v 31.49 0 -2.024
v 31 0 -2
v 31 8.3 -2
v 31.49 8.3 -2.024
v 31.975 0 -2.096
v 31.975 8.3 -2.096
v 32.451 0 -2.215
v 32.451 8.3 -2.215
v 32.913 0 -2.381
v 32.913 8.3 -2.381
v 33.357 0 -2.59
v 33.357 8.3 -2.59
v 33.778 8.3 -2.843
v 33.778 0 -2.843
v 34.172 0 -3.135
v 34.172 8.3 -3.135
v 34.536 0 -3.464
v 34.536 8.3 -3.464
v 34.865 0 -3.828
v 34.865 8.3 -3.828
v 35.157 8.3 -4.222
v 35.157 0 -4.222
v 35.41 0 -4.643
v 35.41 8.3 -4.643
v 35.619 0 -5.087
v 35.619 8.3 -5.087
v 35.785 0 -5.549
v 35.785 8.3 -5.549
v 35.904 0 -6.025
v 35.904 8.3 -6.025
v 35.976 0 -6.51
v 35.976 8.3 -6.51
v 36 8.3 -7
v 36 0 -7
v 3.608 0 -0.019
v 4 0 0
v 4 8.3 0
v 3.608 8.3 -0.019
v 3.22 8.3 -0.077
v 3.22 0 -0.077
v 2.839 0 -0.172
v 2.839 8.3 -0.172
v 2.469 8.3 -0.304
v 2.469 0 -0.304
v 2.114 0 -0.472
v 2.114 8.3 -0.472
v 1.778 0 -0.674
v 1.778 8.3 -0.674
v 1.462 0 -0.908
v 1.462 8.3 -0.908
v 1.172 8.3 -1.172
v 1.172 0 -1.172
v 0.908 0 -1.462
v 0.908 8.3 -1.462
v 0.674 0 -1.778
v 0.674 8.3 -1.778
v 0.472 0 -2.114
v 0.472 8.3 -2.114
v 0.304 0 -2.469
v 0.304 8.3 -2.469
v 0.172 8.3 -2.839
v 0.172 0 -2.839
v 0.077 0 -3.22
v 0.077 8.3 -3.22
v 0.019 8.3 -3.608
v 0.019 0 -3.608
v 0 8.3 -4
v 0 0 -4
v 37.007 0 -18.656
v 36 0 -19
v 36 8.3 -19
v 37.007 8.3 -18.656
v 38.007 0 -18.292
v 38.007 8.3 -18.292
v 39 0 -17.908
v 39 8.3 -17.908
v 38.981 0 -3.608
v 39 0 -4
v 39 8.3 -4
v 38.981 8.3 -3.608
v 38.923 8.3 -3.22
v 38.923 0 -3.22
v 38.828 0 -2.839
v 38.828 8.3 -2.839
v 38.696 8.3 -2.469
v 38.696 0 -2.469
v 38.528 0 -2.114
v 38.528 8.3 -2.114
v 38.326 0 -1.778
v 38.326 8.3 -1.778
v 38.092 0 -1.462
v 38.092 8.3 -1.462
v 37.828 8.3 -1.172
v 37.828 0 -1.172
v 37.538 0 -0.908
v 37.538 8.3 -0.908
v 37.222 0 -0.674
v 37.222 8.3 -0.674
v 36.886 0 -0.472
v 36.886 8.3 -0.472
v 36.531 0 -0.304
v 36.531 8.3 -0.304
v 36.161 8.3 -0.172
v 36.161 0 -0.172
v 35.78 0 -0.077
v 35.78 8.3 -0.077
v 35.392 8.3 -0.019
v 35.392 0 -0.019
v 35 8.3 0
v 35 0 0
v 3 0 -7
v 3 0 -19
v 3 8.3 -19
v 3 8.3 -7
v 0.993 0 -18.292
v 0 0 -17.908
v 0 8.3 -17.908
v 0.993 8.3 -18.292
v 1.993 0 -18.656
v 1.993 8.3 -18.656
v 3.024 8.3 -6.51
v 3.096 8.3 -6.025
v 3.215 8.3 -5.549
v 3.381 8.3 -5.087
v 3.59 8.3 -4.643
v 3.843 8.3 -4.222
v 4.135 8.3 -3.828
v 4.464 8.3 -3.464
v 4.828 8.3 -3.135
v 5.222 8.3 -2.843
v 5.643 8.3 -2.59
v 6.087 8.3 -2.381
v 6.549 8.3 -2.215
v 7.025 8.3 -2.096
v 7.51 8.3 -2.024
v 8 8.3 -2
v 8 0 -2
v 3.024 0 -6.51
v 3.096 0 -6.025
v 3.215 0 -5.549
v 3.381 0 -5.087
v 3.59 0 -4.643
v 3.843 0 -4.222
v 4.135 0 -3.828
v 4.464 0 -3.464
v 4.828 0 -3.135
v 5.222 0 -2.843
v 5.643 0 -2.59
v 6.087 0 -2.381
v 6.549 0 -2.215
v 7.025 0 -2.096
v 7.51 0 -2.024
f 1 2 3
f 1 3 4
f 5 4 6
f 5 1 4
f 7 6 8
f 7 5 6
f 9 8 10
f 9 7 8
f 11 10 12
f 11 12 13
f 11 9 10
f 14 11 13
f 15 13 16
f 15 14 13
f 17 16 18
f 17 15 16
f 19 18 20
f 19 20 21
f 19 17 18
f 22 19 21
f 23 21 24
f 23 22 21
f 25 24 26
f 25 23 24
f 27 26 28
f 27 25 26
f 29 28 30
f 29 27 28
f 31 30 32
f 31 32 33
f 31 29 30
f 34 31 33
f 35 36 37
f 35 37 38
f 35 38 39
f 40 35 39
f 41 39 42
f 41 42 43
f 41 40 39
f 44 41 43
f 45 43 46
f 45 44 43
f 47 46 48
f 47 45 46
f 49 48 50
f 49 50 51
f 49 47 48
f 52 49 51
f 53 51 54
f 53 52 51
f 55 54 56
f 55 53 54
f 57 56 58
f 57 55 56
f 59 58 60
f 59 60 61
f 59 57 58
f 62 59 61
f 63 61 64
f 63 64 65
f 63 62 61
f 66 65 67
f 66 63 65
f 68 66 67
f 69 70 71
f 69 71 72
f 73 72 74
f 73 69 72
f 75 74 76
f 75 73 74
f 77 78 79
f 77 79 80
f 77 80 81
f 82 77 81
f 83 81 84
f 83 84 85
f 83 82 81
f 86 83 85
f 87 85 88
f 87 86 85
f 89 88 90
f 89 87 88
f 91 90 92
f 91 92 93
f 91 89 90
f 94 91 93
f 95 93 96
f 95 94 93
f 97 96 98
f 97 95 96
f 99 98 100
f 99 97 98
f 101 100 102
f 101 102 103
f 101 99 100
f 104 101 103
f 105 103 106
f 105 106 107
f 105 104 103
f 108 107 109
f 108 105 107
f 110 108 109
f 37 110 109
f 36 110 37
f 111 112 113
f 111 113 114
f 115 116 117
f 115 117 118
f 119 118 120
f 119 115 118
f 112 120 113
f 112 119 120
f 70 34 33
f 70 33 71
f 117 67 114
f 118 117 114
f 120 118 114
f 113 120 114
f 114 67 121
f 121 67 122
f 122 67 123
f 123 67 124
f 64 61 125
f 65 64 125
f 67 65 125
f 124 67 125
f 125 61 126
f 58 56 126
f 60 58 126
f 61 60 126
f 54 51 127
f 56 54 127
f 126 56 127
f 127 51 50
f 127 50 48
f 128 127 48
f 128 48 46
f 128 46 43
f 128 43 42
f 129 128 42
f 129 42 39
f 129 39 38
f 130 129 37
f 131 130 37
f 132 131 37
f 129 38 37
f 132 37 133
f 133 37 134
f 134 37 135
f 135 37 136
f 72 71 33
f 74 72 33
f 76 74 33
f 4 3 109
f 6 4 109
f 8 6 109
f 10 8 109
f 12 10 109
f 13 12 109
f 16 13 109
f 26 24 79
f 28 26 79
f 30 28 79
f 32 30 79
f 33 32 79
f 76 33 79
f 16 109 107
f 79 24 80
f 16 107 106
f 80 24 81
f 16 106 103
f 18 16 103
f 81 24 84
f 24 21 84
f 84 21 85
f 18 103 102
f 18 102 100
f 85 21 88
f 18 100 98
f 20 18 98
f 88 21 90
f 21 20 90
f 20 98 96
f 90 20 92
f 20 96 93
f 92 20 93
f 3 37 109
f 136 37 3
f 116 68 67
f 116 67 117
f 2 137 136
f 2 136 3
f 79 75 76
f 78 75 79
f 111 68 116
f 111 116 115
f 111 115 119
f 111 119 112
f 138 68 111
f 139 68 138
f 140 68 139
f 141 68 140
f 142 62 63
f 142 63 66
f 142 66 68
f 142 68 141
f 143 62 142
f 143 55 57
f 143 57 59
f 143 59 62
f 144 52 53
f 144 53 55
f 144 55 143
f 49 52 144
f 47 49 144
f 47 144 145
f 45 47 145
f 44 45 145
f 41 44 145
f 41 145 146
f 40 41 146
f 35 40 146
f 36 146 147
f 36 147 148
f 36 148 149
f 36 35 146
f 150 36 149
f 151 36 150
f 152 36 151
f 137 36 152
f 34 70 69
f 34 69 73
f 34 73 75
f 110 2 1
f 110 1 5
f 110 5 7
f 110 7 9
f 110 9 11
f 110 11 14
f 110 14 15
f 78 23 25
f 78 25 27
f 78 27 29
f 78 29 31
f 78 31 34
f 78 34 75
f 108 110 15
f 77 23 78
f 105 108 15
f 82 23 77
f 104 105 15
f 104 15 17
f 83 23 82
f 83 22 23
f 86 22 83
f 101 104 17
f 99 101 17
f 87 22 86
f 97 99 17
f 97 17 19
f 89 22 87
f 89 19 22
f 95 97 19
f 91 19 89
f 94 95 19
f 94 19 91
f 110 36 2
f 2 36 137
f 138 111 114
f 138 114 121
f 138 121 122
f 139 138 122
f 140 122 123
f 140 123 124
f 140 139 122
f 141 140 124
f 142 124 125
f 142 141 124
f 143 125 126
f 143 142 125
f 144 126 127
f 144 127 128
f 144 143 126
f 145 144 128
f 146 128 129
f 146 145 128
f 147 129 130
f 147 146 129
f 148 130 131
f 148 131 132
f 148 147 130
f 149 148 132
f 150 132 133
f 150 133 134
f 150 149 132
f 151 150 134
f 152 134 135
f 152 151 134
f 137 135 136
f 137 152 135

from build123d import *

# Parameters (mm, degrees)
F1_DEPTH = 8.3


with BuildPart() as f1:
    # F0 (on Front) → F1 (new body)
    with BuildSketch(Plane.XZ):
        with BuildLine():
            Line((35, 0), (4, 0))
            ThreePointArc((4, 0), (1.171573, -1.171573), (0, -4))
            Line((0, -4), (0, -17.908077))
            ThreePointArc((0, -17.908077), (1.491722, -18.476782), (3, -19))
            Line((3, -19), (3, -7))
            ThreePointArc((3, -7), (4.464466, -3.464466), (8, -2))
            Line((8, -2), (31, -2))
            ThreePointArc((31, -2), (34.535534, -3.464466), (36, -7))
            Line((36, -7), (36, -19))
            ThreePointArc((36, -19), (37.508278, -18.476782), (39, -17.908077))
            Line((39, -17.908077), (39, -4))
            ThreePointArc((39, -4), (37.828427, -1.171573), (35, 0))
        make_face()
    extrude(amount=-F1_DEPTH)


solid = f1.part
